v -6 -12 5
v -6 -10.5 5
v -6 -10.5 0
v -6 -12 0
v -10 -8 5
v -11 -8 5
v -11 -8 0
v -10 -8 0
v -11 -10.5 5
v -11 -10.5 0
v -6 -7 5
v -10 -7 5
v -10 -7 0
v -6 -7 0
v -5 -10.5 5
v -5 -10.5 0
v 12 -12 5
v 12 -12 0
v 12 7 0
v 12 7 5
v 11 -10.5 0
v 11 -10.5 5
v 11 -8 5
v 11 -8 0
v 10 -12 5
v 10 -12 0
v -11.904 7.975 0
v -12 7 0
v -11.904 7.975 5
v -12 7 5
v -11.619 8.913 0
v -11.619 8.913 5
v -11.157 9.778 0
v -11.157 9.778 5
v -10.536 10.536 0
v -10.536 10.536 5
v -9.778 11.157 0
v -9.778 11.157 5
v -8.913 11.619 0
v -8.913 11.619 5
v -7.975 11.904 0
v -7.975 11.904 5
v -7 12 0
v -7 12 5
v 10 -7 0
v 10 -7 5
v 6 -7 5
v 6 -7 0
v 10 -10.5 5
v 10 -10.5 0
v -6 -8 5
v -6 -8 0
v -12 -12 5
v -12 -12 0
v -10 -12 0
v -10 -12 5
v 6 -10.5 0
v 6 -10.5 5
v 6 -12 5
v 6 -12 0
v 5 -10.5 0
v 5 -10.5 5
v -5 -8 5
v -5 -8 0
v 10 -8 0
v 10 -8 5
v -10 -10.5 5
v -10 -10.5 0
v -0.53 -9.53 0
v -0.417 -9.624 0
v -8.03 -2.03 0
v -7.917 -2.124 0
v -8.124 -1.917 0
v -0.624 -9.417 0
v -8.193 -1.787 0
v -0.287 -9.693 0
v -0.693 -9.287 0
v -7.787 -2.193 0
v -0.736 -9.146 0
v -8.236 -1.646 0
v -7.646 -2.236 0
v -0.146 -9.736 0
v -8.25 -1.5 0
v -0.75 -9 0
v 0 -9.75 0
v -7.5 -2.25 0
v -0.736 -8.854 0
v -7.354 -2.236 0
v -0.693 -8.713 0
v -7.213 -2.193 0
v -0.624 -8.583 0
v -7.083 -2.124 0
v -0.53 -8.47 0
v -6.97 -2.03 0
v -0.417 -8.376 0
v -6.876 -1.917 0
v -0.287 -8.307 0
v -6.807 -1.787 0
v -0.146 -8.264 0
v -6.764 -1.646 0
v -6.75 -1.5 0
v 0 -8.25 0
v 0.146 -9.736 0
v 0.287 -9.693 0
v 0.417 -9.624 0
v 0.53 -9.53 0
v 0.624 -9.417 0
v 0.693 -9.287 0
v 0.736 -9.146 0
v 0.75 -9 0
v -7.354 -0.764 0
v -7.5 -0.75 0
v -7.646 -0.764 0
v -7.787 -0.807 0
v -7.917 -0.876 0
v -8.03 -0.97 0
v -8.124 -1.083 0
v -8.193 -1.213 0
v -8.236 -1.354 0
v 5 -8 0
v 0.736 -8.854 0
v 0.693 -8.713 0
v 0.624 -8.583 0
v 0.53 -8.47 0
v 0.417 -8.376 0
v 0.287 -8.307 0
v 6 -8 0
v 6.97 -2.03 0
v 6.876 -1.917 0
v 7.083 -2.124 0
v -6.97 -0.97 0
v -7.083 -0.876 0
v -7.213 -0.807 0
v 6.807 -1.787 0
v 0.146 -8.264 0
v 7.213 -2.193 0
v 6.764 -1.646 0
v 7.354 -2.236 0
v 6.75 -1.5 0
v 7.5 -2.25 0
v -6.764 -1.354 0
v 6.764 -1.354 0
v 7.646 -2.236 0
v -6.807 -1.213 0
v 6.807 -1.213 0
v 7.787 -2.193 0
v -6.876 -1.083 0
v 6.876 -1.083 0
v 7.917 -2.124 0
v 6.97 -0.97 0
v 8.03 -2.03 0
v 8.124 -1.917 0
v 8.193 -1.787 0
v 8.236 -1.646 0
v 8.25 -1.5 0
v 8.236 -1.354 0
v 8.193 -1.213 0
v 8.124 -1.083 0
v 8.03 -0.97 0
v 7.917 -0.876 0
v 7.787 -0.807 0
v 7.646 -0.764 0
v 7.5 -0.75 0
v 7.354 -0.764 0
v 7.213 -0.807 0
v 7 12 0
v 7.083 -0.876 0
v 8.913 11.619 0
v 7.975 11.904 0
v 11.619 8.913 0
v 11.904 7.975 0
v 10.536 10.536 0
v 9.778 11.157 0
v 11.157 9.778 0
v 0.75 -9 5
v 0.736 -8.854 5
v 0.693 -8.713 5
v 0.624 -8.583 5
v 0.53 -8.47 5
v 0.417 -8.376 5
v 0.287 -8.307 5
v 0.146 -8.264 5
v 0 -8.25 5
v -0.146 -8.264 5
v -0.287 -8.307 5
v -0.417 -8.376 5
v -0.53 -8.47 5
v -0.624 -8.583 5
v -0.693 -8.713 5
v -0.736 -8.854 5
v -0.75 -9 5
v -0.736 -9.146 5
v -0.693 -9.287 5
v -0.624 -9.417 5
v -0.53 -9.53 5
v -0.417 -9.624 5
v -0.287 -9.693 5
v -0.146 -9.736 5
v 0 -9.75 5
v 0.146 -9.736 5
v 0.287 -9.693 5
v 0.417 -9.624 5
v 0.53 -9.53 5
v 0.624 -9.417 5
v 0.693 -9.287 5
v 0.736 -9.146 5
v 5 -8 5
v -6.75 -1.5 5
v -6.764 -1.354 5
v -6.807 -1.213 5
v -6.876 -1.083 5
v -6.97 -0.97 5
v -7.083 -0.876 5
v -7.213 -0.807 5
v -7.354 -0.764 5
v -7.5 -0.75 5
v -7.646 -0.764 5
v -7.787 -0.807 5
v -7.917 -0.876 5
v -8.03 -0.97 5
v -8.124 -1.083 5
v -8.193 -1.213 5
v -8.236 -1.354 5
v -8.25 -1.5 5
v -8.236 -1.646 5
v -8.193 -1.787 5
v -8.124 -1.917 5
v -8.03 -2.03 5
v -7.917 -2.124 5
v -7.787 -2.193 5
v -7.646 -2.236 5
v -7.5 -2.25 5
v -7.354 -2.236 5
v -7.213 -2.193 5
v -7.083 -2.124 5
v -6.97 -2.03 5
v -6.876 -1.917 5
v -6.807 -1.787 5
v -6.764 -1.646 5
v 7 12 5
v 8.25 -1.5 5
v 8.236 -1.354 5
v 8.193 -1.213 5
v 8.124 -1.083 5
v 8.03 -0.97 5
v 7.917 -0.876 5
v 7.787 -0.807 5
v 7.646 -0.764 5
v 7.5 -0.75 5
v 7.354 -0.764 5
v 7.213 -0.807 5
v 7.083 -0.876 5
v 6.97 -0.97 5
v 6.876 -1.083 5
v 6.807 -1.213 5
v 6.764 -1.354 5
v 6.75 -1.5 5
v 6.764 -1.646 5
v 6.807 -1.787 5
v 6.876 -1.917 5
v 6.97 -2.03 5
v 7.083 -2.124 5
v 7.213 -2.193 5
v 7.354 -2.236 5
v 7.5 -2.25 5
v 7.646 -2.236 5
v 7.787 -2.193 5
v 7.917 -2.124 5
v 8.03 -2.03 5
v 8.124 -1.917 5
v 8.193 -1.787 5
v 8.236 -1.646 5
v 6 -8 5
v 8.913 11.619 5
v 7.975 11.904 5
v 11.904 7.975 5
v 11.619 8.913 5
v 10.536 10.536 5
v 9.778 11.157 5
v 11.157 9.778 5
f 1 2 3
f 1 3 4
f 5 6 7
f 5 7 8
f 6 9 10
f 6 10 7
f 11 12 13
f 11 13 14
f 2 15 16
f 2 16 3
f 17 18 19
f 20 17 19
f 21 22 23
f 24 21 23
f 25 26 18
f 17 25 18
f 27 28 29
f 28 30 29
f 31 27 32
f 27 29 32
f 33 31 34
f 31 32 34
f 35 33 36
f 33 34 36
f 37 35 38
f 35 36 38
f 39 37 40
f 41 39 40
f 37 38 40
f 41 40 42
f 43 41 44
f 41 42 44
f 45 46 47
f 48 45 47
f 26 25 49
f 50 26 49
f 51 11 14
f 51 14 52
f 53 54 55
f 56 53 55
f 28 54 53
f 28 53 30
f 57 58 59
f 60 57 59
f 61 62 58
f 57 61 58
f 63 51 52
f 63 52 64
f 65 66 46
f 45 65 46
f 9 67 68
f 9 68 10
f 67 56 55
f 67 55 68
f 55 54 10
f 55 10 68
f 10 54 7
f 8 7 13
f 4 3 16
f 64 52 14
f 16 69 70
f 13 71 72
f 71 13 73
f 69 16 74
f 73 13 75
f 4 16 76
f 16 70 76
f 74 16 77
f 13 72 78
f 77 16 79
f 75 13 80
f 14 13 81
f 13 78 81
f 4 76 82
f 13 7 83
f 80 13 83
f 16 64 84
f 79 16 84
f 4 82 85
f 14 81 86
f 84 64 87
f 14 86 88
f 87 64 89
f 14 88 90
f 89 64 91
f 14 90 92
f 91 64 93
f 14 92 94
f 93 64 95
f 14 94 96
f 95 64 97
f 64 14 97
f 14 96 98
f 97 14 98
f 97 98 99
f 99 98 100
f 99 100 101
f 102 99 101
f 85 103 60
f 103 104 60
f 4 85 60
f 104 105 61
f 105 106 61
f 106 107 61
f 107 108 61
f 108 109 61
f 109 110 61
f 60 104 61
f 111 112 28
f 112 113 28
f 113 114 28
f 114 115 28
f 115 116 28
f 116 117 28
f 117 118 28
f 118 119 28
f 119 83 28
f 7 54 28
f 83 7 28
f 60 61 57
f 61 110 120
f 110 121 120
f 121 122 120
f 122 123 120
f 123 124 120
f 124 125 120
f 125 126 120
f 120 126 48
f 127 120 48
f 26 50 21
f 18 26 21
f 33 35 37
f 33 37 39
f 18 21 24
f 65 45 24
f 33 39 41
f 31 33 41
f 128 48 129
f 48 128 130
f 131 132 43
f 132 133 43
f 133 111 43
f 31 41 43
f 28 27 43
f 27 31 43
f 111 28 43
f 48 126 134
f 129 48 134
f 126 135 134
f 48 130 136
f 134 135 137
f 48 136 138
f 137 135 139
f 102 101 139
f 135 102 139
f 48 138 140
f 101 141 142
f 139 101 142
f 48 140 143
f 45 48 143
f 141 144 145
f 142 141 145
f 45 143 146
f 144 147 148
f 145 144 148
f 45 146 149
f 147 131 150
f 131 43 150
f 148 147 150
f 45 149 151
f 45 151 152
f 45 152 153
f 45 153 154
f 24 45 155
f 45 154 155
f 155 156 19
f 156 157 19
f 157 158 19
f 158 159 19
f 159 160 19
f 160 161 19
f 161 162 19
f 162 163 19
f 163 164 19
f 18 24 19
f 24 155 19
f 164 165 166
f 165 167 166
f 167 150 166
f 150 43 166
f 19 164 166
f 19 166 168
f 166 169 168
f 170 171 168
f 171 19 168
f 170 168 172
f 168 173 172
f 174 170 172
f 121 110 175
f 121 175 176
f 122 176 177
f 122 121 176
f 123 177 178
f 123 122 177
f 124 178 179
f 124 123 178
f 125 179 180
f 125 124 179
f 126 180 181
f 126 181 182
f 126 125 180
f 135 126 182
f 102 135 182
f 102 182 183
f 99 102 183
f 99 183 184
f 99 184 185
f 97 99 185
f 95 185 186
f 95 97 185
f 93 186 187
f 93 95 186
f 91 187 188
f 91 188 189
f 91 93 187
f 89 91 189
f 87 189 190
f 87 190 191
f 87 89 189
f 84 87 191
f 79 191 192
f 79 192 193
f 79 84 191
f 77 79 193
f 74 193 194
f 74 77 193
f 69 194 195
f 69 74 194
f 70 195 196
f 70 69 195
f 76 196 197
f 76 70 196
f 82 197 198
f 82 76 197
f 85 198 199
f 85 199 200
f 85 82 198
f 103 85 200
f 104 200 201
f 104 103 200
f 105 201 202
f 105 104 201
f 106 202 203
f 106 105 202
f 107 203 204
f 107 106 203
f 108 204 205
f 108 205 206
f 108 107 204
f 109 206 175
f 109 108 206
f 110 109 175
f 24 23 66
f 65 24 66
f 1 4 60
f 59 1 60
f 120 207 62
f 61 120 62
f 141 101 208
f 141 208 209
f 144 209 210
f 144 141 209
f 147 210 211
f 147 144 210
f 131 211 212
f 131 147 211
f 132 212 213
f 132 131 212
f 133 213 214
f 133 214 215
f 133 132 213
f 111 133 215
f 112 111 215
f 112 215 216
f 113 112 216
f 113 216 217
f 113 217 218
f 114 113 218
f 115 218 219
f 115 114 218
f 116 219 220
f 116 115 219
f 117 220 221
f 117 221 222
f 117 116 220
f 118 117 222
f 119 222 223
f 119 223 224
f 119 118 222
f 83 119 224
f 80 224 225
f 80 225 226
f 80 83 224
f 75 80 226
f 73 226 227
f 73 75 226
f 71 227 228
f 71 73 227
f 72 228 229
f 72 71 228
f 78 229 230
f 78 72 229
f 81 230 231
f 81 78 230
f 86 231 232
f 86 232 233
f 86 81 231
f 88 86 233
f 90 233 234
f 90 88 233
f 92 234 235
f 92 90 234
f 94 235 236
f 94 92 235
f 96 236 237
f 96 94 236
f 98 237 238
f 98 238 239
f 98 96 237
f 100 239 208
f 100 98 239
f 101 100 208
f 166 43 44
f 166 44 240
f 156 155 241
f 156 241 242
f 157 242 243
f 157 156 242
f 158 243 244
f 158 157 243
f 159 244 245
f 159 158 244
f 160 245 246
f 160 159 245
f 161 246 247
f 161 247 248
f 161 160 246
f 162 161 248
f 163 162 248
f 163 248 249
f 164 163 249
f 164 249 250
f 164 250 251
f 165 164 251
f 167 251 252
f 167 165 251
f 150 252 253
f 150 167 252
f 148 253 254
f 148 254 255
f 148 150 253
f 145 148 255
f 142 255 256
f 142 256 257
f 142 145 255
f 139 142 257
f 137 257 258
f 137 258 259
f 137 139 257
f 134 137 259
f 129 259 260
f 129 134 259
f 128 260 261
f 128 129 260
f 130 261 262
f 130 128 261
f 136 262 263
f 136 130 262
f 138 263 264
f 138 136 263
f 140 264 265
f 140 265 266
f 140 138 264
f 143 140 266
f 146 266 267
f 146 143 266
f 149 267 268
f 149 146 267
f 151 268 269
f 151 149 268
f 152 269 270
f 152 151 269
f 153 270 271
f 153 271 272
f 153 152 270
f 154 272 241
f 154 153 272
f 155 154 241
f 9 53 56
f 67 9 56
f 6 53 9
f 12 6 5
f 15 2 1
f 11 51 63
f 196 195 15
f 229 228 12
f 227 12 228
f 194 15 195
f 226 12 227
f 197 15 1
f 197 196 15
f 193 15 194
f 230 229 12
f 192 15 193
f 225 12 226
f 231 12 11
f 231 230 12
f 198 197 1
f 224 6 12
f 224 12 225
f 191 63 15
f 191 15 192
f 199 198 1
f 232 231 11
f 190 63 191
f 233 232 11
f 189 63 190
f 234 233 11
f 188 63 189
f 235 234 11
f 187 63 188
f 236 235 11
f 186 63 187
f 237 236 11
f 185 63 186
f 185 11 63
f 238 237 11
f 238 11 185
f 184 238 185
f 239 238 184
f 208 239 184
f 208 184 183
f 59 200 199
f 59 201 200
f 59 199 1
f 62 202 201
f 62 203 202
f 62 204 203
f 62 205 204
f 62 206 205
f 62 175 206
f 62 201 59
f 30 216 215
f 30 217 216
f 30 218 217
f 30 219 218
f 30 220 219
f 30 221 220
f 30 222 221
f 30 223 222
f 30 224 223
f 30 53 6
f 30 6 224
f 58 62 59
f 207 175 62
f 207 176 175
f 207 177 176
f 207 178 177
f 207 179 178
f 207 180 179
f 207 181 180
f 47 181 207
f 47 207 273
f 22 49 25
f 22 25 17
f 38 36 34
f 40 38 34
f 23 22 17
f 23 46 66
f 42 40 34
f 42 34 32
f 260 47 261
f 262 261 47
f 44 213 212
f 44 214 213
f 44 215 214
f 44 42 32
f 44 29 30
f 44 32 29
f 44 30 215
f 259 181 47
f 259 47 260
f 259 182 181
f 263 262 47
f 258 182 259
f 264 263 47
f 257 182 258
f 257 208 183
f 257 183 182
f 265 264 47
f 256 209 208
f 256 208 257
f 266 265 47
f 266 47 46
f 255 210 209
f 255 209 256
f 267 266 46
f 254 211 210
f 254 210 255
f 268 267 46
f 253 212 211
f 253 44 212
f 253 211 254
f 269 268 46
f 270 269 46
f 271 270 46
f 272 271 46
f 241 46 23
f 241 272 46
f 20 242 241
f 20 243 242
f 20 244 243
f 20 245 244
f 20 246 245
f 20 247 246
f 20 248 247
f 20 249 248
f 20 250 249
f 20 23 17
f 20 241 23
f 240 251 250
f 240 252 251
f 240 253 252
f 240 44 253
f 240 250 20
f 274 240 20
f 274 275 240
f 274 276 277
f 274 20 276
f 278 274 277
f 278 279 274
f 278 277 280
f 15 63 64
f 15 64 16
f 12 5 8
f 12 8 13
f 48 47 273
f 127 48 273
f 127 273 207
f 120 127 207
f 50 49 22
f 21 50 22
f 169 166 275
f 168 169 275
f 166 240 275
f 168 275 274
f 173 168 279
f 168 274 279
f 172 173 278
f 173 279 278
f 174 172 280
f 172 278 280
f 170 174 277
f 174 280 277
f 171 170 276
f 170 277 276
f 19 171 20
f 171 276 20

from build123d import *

# Parameters (mm, degrees)
SKETCH1_W           = 24
SKETCH1_H           = 24
SKETCH1_R           = 0.75
BOSS_EXTRUDE1_DEPTH = 5
FILLET1_R           = 5
CUT_EXTRUDE1_DEPTH  = 5


with BuildPart() as part:
    # Sketch1 → Boss-Extrude1 (new body)
    with BuildSketch(Plane.XY):
        Rectangle(SKETCH1_W, SKETCH1_H)
        with Locations((0, -9)):
            Circle(SKETCH1_R, mode=Mode.SUBTRACT)
        with Locations((-7.5, -1.5)):
            Circle(SKETCH1_R, mode=Mode.SUBTRACT)
        with Locations((7.5, -1.5)):
            Circle(SKETCH1_R, mode=Mode.SUBTRACT)
    extrude(amount=BOSS_EXTRUDE1_DEPTH)

    # Fillet1
    fillet1_edges = [part.edges().sort_by_distance(p)[0] for p in [
        (-12, 12, 2.5),
        (12, 12, 2.5),
    ]]
    fillet(fillet1_edges, radius=FILLET1_R)

    # Sketch2 → Cut-Extrude1 (cut)
    with BuildSketch(Plane.XY.offset(5)):
        Polygon((-10, -12), (-10, -10.5), (-11, -10.5), (-11, -8), (-10, -8), (-10, -7), (-6, -7), (-6, -8), (-5, -8), (-5, -10.5), (-6, -10.5), (-6, -12), align=None)
    cut_extrude1 = extrude(amount=-CUT_EXTRUDE1_DEPTH, mode=Mode.SUBTRACT)

    # Mirror1: Cut-Extrude1 across plane
    add(cut_extrude1.mirror(Plane(origin=(0, 0, 0), x_dir=(0, 0, 1), z_dir=(1, 0, 0))), mode=Mode.SUBTRACT)


solid = part.part
